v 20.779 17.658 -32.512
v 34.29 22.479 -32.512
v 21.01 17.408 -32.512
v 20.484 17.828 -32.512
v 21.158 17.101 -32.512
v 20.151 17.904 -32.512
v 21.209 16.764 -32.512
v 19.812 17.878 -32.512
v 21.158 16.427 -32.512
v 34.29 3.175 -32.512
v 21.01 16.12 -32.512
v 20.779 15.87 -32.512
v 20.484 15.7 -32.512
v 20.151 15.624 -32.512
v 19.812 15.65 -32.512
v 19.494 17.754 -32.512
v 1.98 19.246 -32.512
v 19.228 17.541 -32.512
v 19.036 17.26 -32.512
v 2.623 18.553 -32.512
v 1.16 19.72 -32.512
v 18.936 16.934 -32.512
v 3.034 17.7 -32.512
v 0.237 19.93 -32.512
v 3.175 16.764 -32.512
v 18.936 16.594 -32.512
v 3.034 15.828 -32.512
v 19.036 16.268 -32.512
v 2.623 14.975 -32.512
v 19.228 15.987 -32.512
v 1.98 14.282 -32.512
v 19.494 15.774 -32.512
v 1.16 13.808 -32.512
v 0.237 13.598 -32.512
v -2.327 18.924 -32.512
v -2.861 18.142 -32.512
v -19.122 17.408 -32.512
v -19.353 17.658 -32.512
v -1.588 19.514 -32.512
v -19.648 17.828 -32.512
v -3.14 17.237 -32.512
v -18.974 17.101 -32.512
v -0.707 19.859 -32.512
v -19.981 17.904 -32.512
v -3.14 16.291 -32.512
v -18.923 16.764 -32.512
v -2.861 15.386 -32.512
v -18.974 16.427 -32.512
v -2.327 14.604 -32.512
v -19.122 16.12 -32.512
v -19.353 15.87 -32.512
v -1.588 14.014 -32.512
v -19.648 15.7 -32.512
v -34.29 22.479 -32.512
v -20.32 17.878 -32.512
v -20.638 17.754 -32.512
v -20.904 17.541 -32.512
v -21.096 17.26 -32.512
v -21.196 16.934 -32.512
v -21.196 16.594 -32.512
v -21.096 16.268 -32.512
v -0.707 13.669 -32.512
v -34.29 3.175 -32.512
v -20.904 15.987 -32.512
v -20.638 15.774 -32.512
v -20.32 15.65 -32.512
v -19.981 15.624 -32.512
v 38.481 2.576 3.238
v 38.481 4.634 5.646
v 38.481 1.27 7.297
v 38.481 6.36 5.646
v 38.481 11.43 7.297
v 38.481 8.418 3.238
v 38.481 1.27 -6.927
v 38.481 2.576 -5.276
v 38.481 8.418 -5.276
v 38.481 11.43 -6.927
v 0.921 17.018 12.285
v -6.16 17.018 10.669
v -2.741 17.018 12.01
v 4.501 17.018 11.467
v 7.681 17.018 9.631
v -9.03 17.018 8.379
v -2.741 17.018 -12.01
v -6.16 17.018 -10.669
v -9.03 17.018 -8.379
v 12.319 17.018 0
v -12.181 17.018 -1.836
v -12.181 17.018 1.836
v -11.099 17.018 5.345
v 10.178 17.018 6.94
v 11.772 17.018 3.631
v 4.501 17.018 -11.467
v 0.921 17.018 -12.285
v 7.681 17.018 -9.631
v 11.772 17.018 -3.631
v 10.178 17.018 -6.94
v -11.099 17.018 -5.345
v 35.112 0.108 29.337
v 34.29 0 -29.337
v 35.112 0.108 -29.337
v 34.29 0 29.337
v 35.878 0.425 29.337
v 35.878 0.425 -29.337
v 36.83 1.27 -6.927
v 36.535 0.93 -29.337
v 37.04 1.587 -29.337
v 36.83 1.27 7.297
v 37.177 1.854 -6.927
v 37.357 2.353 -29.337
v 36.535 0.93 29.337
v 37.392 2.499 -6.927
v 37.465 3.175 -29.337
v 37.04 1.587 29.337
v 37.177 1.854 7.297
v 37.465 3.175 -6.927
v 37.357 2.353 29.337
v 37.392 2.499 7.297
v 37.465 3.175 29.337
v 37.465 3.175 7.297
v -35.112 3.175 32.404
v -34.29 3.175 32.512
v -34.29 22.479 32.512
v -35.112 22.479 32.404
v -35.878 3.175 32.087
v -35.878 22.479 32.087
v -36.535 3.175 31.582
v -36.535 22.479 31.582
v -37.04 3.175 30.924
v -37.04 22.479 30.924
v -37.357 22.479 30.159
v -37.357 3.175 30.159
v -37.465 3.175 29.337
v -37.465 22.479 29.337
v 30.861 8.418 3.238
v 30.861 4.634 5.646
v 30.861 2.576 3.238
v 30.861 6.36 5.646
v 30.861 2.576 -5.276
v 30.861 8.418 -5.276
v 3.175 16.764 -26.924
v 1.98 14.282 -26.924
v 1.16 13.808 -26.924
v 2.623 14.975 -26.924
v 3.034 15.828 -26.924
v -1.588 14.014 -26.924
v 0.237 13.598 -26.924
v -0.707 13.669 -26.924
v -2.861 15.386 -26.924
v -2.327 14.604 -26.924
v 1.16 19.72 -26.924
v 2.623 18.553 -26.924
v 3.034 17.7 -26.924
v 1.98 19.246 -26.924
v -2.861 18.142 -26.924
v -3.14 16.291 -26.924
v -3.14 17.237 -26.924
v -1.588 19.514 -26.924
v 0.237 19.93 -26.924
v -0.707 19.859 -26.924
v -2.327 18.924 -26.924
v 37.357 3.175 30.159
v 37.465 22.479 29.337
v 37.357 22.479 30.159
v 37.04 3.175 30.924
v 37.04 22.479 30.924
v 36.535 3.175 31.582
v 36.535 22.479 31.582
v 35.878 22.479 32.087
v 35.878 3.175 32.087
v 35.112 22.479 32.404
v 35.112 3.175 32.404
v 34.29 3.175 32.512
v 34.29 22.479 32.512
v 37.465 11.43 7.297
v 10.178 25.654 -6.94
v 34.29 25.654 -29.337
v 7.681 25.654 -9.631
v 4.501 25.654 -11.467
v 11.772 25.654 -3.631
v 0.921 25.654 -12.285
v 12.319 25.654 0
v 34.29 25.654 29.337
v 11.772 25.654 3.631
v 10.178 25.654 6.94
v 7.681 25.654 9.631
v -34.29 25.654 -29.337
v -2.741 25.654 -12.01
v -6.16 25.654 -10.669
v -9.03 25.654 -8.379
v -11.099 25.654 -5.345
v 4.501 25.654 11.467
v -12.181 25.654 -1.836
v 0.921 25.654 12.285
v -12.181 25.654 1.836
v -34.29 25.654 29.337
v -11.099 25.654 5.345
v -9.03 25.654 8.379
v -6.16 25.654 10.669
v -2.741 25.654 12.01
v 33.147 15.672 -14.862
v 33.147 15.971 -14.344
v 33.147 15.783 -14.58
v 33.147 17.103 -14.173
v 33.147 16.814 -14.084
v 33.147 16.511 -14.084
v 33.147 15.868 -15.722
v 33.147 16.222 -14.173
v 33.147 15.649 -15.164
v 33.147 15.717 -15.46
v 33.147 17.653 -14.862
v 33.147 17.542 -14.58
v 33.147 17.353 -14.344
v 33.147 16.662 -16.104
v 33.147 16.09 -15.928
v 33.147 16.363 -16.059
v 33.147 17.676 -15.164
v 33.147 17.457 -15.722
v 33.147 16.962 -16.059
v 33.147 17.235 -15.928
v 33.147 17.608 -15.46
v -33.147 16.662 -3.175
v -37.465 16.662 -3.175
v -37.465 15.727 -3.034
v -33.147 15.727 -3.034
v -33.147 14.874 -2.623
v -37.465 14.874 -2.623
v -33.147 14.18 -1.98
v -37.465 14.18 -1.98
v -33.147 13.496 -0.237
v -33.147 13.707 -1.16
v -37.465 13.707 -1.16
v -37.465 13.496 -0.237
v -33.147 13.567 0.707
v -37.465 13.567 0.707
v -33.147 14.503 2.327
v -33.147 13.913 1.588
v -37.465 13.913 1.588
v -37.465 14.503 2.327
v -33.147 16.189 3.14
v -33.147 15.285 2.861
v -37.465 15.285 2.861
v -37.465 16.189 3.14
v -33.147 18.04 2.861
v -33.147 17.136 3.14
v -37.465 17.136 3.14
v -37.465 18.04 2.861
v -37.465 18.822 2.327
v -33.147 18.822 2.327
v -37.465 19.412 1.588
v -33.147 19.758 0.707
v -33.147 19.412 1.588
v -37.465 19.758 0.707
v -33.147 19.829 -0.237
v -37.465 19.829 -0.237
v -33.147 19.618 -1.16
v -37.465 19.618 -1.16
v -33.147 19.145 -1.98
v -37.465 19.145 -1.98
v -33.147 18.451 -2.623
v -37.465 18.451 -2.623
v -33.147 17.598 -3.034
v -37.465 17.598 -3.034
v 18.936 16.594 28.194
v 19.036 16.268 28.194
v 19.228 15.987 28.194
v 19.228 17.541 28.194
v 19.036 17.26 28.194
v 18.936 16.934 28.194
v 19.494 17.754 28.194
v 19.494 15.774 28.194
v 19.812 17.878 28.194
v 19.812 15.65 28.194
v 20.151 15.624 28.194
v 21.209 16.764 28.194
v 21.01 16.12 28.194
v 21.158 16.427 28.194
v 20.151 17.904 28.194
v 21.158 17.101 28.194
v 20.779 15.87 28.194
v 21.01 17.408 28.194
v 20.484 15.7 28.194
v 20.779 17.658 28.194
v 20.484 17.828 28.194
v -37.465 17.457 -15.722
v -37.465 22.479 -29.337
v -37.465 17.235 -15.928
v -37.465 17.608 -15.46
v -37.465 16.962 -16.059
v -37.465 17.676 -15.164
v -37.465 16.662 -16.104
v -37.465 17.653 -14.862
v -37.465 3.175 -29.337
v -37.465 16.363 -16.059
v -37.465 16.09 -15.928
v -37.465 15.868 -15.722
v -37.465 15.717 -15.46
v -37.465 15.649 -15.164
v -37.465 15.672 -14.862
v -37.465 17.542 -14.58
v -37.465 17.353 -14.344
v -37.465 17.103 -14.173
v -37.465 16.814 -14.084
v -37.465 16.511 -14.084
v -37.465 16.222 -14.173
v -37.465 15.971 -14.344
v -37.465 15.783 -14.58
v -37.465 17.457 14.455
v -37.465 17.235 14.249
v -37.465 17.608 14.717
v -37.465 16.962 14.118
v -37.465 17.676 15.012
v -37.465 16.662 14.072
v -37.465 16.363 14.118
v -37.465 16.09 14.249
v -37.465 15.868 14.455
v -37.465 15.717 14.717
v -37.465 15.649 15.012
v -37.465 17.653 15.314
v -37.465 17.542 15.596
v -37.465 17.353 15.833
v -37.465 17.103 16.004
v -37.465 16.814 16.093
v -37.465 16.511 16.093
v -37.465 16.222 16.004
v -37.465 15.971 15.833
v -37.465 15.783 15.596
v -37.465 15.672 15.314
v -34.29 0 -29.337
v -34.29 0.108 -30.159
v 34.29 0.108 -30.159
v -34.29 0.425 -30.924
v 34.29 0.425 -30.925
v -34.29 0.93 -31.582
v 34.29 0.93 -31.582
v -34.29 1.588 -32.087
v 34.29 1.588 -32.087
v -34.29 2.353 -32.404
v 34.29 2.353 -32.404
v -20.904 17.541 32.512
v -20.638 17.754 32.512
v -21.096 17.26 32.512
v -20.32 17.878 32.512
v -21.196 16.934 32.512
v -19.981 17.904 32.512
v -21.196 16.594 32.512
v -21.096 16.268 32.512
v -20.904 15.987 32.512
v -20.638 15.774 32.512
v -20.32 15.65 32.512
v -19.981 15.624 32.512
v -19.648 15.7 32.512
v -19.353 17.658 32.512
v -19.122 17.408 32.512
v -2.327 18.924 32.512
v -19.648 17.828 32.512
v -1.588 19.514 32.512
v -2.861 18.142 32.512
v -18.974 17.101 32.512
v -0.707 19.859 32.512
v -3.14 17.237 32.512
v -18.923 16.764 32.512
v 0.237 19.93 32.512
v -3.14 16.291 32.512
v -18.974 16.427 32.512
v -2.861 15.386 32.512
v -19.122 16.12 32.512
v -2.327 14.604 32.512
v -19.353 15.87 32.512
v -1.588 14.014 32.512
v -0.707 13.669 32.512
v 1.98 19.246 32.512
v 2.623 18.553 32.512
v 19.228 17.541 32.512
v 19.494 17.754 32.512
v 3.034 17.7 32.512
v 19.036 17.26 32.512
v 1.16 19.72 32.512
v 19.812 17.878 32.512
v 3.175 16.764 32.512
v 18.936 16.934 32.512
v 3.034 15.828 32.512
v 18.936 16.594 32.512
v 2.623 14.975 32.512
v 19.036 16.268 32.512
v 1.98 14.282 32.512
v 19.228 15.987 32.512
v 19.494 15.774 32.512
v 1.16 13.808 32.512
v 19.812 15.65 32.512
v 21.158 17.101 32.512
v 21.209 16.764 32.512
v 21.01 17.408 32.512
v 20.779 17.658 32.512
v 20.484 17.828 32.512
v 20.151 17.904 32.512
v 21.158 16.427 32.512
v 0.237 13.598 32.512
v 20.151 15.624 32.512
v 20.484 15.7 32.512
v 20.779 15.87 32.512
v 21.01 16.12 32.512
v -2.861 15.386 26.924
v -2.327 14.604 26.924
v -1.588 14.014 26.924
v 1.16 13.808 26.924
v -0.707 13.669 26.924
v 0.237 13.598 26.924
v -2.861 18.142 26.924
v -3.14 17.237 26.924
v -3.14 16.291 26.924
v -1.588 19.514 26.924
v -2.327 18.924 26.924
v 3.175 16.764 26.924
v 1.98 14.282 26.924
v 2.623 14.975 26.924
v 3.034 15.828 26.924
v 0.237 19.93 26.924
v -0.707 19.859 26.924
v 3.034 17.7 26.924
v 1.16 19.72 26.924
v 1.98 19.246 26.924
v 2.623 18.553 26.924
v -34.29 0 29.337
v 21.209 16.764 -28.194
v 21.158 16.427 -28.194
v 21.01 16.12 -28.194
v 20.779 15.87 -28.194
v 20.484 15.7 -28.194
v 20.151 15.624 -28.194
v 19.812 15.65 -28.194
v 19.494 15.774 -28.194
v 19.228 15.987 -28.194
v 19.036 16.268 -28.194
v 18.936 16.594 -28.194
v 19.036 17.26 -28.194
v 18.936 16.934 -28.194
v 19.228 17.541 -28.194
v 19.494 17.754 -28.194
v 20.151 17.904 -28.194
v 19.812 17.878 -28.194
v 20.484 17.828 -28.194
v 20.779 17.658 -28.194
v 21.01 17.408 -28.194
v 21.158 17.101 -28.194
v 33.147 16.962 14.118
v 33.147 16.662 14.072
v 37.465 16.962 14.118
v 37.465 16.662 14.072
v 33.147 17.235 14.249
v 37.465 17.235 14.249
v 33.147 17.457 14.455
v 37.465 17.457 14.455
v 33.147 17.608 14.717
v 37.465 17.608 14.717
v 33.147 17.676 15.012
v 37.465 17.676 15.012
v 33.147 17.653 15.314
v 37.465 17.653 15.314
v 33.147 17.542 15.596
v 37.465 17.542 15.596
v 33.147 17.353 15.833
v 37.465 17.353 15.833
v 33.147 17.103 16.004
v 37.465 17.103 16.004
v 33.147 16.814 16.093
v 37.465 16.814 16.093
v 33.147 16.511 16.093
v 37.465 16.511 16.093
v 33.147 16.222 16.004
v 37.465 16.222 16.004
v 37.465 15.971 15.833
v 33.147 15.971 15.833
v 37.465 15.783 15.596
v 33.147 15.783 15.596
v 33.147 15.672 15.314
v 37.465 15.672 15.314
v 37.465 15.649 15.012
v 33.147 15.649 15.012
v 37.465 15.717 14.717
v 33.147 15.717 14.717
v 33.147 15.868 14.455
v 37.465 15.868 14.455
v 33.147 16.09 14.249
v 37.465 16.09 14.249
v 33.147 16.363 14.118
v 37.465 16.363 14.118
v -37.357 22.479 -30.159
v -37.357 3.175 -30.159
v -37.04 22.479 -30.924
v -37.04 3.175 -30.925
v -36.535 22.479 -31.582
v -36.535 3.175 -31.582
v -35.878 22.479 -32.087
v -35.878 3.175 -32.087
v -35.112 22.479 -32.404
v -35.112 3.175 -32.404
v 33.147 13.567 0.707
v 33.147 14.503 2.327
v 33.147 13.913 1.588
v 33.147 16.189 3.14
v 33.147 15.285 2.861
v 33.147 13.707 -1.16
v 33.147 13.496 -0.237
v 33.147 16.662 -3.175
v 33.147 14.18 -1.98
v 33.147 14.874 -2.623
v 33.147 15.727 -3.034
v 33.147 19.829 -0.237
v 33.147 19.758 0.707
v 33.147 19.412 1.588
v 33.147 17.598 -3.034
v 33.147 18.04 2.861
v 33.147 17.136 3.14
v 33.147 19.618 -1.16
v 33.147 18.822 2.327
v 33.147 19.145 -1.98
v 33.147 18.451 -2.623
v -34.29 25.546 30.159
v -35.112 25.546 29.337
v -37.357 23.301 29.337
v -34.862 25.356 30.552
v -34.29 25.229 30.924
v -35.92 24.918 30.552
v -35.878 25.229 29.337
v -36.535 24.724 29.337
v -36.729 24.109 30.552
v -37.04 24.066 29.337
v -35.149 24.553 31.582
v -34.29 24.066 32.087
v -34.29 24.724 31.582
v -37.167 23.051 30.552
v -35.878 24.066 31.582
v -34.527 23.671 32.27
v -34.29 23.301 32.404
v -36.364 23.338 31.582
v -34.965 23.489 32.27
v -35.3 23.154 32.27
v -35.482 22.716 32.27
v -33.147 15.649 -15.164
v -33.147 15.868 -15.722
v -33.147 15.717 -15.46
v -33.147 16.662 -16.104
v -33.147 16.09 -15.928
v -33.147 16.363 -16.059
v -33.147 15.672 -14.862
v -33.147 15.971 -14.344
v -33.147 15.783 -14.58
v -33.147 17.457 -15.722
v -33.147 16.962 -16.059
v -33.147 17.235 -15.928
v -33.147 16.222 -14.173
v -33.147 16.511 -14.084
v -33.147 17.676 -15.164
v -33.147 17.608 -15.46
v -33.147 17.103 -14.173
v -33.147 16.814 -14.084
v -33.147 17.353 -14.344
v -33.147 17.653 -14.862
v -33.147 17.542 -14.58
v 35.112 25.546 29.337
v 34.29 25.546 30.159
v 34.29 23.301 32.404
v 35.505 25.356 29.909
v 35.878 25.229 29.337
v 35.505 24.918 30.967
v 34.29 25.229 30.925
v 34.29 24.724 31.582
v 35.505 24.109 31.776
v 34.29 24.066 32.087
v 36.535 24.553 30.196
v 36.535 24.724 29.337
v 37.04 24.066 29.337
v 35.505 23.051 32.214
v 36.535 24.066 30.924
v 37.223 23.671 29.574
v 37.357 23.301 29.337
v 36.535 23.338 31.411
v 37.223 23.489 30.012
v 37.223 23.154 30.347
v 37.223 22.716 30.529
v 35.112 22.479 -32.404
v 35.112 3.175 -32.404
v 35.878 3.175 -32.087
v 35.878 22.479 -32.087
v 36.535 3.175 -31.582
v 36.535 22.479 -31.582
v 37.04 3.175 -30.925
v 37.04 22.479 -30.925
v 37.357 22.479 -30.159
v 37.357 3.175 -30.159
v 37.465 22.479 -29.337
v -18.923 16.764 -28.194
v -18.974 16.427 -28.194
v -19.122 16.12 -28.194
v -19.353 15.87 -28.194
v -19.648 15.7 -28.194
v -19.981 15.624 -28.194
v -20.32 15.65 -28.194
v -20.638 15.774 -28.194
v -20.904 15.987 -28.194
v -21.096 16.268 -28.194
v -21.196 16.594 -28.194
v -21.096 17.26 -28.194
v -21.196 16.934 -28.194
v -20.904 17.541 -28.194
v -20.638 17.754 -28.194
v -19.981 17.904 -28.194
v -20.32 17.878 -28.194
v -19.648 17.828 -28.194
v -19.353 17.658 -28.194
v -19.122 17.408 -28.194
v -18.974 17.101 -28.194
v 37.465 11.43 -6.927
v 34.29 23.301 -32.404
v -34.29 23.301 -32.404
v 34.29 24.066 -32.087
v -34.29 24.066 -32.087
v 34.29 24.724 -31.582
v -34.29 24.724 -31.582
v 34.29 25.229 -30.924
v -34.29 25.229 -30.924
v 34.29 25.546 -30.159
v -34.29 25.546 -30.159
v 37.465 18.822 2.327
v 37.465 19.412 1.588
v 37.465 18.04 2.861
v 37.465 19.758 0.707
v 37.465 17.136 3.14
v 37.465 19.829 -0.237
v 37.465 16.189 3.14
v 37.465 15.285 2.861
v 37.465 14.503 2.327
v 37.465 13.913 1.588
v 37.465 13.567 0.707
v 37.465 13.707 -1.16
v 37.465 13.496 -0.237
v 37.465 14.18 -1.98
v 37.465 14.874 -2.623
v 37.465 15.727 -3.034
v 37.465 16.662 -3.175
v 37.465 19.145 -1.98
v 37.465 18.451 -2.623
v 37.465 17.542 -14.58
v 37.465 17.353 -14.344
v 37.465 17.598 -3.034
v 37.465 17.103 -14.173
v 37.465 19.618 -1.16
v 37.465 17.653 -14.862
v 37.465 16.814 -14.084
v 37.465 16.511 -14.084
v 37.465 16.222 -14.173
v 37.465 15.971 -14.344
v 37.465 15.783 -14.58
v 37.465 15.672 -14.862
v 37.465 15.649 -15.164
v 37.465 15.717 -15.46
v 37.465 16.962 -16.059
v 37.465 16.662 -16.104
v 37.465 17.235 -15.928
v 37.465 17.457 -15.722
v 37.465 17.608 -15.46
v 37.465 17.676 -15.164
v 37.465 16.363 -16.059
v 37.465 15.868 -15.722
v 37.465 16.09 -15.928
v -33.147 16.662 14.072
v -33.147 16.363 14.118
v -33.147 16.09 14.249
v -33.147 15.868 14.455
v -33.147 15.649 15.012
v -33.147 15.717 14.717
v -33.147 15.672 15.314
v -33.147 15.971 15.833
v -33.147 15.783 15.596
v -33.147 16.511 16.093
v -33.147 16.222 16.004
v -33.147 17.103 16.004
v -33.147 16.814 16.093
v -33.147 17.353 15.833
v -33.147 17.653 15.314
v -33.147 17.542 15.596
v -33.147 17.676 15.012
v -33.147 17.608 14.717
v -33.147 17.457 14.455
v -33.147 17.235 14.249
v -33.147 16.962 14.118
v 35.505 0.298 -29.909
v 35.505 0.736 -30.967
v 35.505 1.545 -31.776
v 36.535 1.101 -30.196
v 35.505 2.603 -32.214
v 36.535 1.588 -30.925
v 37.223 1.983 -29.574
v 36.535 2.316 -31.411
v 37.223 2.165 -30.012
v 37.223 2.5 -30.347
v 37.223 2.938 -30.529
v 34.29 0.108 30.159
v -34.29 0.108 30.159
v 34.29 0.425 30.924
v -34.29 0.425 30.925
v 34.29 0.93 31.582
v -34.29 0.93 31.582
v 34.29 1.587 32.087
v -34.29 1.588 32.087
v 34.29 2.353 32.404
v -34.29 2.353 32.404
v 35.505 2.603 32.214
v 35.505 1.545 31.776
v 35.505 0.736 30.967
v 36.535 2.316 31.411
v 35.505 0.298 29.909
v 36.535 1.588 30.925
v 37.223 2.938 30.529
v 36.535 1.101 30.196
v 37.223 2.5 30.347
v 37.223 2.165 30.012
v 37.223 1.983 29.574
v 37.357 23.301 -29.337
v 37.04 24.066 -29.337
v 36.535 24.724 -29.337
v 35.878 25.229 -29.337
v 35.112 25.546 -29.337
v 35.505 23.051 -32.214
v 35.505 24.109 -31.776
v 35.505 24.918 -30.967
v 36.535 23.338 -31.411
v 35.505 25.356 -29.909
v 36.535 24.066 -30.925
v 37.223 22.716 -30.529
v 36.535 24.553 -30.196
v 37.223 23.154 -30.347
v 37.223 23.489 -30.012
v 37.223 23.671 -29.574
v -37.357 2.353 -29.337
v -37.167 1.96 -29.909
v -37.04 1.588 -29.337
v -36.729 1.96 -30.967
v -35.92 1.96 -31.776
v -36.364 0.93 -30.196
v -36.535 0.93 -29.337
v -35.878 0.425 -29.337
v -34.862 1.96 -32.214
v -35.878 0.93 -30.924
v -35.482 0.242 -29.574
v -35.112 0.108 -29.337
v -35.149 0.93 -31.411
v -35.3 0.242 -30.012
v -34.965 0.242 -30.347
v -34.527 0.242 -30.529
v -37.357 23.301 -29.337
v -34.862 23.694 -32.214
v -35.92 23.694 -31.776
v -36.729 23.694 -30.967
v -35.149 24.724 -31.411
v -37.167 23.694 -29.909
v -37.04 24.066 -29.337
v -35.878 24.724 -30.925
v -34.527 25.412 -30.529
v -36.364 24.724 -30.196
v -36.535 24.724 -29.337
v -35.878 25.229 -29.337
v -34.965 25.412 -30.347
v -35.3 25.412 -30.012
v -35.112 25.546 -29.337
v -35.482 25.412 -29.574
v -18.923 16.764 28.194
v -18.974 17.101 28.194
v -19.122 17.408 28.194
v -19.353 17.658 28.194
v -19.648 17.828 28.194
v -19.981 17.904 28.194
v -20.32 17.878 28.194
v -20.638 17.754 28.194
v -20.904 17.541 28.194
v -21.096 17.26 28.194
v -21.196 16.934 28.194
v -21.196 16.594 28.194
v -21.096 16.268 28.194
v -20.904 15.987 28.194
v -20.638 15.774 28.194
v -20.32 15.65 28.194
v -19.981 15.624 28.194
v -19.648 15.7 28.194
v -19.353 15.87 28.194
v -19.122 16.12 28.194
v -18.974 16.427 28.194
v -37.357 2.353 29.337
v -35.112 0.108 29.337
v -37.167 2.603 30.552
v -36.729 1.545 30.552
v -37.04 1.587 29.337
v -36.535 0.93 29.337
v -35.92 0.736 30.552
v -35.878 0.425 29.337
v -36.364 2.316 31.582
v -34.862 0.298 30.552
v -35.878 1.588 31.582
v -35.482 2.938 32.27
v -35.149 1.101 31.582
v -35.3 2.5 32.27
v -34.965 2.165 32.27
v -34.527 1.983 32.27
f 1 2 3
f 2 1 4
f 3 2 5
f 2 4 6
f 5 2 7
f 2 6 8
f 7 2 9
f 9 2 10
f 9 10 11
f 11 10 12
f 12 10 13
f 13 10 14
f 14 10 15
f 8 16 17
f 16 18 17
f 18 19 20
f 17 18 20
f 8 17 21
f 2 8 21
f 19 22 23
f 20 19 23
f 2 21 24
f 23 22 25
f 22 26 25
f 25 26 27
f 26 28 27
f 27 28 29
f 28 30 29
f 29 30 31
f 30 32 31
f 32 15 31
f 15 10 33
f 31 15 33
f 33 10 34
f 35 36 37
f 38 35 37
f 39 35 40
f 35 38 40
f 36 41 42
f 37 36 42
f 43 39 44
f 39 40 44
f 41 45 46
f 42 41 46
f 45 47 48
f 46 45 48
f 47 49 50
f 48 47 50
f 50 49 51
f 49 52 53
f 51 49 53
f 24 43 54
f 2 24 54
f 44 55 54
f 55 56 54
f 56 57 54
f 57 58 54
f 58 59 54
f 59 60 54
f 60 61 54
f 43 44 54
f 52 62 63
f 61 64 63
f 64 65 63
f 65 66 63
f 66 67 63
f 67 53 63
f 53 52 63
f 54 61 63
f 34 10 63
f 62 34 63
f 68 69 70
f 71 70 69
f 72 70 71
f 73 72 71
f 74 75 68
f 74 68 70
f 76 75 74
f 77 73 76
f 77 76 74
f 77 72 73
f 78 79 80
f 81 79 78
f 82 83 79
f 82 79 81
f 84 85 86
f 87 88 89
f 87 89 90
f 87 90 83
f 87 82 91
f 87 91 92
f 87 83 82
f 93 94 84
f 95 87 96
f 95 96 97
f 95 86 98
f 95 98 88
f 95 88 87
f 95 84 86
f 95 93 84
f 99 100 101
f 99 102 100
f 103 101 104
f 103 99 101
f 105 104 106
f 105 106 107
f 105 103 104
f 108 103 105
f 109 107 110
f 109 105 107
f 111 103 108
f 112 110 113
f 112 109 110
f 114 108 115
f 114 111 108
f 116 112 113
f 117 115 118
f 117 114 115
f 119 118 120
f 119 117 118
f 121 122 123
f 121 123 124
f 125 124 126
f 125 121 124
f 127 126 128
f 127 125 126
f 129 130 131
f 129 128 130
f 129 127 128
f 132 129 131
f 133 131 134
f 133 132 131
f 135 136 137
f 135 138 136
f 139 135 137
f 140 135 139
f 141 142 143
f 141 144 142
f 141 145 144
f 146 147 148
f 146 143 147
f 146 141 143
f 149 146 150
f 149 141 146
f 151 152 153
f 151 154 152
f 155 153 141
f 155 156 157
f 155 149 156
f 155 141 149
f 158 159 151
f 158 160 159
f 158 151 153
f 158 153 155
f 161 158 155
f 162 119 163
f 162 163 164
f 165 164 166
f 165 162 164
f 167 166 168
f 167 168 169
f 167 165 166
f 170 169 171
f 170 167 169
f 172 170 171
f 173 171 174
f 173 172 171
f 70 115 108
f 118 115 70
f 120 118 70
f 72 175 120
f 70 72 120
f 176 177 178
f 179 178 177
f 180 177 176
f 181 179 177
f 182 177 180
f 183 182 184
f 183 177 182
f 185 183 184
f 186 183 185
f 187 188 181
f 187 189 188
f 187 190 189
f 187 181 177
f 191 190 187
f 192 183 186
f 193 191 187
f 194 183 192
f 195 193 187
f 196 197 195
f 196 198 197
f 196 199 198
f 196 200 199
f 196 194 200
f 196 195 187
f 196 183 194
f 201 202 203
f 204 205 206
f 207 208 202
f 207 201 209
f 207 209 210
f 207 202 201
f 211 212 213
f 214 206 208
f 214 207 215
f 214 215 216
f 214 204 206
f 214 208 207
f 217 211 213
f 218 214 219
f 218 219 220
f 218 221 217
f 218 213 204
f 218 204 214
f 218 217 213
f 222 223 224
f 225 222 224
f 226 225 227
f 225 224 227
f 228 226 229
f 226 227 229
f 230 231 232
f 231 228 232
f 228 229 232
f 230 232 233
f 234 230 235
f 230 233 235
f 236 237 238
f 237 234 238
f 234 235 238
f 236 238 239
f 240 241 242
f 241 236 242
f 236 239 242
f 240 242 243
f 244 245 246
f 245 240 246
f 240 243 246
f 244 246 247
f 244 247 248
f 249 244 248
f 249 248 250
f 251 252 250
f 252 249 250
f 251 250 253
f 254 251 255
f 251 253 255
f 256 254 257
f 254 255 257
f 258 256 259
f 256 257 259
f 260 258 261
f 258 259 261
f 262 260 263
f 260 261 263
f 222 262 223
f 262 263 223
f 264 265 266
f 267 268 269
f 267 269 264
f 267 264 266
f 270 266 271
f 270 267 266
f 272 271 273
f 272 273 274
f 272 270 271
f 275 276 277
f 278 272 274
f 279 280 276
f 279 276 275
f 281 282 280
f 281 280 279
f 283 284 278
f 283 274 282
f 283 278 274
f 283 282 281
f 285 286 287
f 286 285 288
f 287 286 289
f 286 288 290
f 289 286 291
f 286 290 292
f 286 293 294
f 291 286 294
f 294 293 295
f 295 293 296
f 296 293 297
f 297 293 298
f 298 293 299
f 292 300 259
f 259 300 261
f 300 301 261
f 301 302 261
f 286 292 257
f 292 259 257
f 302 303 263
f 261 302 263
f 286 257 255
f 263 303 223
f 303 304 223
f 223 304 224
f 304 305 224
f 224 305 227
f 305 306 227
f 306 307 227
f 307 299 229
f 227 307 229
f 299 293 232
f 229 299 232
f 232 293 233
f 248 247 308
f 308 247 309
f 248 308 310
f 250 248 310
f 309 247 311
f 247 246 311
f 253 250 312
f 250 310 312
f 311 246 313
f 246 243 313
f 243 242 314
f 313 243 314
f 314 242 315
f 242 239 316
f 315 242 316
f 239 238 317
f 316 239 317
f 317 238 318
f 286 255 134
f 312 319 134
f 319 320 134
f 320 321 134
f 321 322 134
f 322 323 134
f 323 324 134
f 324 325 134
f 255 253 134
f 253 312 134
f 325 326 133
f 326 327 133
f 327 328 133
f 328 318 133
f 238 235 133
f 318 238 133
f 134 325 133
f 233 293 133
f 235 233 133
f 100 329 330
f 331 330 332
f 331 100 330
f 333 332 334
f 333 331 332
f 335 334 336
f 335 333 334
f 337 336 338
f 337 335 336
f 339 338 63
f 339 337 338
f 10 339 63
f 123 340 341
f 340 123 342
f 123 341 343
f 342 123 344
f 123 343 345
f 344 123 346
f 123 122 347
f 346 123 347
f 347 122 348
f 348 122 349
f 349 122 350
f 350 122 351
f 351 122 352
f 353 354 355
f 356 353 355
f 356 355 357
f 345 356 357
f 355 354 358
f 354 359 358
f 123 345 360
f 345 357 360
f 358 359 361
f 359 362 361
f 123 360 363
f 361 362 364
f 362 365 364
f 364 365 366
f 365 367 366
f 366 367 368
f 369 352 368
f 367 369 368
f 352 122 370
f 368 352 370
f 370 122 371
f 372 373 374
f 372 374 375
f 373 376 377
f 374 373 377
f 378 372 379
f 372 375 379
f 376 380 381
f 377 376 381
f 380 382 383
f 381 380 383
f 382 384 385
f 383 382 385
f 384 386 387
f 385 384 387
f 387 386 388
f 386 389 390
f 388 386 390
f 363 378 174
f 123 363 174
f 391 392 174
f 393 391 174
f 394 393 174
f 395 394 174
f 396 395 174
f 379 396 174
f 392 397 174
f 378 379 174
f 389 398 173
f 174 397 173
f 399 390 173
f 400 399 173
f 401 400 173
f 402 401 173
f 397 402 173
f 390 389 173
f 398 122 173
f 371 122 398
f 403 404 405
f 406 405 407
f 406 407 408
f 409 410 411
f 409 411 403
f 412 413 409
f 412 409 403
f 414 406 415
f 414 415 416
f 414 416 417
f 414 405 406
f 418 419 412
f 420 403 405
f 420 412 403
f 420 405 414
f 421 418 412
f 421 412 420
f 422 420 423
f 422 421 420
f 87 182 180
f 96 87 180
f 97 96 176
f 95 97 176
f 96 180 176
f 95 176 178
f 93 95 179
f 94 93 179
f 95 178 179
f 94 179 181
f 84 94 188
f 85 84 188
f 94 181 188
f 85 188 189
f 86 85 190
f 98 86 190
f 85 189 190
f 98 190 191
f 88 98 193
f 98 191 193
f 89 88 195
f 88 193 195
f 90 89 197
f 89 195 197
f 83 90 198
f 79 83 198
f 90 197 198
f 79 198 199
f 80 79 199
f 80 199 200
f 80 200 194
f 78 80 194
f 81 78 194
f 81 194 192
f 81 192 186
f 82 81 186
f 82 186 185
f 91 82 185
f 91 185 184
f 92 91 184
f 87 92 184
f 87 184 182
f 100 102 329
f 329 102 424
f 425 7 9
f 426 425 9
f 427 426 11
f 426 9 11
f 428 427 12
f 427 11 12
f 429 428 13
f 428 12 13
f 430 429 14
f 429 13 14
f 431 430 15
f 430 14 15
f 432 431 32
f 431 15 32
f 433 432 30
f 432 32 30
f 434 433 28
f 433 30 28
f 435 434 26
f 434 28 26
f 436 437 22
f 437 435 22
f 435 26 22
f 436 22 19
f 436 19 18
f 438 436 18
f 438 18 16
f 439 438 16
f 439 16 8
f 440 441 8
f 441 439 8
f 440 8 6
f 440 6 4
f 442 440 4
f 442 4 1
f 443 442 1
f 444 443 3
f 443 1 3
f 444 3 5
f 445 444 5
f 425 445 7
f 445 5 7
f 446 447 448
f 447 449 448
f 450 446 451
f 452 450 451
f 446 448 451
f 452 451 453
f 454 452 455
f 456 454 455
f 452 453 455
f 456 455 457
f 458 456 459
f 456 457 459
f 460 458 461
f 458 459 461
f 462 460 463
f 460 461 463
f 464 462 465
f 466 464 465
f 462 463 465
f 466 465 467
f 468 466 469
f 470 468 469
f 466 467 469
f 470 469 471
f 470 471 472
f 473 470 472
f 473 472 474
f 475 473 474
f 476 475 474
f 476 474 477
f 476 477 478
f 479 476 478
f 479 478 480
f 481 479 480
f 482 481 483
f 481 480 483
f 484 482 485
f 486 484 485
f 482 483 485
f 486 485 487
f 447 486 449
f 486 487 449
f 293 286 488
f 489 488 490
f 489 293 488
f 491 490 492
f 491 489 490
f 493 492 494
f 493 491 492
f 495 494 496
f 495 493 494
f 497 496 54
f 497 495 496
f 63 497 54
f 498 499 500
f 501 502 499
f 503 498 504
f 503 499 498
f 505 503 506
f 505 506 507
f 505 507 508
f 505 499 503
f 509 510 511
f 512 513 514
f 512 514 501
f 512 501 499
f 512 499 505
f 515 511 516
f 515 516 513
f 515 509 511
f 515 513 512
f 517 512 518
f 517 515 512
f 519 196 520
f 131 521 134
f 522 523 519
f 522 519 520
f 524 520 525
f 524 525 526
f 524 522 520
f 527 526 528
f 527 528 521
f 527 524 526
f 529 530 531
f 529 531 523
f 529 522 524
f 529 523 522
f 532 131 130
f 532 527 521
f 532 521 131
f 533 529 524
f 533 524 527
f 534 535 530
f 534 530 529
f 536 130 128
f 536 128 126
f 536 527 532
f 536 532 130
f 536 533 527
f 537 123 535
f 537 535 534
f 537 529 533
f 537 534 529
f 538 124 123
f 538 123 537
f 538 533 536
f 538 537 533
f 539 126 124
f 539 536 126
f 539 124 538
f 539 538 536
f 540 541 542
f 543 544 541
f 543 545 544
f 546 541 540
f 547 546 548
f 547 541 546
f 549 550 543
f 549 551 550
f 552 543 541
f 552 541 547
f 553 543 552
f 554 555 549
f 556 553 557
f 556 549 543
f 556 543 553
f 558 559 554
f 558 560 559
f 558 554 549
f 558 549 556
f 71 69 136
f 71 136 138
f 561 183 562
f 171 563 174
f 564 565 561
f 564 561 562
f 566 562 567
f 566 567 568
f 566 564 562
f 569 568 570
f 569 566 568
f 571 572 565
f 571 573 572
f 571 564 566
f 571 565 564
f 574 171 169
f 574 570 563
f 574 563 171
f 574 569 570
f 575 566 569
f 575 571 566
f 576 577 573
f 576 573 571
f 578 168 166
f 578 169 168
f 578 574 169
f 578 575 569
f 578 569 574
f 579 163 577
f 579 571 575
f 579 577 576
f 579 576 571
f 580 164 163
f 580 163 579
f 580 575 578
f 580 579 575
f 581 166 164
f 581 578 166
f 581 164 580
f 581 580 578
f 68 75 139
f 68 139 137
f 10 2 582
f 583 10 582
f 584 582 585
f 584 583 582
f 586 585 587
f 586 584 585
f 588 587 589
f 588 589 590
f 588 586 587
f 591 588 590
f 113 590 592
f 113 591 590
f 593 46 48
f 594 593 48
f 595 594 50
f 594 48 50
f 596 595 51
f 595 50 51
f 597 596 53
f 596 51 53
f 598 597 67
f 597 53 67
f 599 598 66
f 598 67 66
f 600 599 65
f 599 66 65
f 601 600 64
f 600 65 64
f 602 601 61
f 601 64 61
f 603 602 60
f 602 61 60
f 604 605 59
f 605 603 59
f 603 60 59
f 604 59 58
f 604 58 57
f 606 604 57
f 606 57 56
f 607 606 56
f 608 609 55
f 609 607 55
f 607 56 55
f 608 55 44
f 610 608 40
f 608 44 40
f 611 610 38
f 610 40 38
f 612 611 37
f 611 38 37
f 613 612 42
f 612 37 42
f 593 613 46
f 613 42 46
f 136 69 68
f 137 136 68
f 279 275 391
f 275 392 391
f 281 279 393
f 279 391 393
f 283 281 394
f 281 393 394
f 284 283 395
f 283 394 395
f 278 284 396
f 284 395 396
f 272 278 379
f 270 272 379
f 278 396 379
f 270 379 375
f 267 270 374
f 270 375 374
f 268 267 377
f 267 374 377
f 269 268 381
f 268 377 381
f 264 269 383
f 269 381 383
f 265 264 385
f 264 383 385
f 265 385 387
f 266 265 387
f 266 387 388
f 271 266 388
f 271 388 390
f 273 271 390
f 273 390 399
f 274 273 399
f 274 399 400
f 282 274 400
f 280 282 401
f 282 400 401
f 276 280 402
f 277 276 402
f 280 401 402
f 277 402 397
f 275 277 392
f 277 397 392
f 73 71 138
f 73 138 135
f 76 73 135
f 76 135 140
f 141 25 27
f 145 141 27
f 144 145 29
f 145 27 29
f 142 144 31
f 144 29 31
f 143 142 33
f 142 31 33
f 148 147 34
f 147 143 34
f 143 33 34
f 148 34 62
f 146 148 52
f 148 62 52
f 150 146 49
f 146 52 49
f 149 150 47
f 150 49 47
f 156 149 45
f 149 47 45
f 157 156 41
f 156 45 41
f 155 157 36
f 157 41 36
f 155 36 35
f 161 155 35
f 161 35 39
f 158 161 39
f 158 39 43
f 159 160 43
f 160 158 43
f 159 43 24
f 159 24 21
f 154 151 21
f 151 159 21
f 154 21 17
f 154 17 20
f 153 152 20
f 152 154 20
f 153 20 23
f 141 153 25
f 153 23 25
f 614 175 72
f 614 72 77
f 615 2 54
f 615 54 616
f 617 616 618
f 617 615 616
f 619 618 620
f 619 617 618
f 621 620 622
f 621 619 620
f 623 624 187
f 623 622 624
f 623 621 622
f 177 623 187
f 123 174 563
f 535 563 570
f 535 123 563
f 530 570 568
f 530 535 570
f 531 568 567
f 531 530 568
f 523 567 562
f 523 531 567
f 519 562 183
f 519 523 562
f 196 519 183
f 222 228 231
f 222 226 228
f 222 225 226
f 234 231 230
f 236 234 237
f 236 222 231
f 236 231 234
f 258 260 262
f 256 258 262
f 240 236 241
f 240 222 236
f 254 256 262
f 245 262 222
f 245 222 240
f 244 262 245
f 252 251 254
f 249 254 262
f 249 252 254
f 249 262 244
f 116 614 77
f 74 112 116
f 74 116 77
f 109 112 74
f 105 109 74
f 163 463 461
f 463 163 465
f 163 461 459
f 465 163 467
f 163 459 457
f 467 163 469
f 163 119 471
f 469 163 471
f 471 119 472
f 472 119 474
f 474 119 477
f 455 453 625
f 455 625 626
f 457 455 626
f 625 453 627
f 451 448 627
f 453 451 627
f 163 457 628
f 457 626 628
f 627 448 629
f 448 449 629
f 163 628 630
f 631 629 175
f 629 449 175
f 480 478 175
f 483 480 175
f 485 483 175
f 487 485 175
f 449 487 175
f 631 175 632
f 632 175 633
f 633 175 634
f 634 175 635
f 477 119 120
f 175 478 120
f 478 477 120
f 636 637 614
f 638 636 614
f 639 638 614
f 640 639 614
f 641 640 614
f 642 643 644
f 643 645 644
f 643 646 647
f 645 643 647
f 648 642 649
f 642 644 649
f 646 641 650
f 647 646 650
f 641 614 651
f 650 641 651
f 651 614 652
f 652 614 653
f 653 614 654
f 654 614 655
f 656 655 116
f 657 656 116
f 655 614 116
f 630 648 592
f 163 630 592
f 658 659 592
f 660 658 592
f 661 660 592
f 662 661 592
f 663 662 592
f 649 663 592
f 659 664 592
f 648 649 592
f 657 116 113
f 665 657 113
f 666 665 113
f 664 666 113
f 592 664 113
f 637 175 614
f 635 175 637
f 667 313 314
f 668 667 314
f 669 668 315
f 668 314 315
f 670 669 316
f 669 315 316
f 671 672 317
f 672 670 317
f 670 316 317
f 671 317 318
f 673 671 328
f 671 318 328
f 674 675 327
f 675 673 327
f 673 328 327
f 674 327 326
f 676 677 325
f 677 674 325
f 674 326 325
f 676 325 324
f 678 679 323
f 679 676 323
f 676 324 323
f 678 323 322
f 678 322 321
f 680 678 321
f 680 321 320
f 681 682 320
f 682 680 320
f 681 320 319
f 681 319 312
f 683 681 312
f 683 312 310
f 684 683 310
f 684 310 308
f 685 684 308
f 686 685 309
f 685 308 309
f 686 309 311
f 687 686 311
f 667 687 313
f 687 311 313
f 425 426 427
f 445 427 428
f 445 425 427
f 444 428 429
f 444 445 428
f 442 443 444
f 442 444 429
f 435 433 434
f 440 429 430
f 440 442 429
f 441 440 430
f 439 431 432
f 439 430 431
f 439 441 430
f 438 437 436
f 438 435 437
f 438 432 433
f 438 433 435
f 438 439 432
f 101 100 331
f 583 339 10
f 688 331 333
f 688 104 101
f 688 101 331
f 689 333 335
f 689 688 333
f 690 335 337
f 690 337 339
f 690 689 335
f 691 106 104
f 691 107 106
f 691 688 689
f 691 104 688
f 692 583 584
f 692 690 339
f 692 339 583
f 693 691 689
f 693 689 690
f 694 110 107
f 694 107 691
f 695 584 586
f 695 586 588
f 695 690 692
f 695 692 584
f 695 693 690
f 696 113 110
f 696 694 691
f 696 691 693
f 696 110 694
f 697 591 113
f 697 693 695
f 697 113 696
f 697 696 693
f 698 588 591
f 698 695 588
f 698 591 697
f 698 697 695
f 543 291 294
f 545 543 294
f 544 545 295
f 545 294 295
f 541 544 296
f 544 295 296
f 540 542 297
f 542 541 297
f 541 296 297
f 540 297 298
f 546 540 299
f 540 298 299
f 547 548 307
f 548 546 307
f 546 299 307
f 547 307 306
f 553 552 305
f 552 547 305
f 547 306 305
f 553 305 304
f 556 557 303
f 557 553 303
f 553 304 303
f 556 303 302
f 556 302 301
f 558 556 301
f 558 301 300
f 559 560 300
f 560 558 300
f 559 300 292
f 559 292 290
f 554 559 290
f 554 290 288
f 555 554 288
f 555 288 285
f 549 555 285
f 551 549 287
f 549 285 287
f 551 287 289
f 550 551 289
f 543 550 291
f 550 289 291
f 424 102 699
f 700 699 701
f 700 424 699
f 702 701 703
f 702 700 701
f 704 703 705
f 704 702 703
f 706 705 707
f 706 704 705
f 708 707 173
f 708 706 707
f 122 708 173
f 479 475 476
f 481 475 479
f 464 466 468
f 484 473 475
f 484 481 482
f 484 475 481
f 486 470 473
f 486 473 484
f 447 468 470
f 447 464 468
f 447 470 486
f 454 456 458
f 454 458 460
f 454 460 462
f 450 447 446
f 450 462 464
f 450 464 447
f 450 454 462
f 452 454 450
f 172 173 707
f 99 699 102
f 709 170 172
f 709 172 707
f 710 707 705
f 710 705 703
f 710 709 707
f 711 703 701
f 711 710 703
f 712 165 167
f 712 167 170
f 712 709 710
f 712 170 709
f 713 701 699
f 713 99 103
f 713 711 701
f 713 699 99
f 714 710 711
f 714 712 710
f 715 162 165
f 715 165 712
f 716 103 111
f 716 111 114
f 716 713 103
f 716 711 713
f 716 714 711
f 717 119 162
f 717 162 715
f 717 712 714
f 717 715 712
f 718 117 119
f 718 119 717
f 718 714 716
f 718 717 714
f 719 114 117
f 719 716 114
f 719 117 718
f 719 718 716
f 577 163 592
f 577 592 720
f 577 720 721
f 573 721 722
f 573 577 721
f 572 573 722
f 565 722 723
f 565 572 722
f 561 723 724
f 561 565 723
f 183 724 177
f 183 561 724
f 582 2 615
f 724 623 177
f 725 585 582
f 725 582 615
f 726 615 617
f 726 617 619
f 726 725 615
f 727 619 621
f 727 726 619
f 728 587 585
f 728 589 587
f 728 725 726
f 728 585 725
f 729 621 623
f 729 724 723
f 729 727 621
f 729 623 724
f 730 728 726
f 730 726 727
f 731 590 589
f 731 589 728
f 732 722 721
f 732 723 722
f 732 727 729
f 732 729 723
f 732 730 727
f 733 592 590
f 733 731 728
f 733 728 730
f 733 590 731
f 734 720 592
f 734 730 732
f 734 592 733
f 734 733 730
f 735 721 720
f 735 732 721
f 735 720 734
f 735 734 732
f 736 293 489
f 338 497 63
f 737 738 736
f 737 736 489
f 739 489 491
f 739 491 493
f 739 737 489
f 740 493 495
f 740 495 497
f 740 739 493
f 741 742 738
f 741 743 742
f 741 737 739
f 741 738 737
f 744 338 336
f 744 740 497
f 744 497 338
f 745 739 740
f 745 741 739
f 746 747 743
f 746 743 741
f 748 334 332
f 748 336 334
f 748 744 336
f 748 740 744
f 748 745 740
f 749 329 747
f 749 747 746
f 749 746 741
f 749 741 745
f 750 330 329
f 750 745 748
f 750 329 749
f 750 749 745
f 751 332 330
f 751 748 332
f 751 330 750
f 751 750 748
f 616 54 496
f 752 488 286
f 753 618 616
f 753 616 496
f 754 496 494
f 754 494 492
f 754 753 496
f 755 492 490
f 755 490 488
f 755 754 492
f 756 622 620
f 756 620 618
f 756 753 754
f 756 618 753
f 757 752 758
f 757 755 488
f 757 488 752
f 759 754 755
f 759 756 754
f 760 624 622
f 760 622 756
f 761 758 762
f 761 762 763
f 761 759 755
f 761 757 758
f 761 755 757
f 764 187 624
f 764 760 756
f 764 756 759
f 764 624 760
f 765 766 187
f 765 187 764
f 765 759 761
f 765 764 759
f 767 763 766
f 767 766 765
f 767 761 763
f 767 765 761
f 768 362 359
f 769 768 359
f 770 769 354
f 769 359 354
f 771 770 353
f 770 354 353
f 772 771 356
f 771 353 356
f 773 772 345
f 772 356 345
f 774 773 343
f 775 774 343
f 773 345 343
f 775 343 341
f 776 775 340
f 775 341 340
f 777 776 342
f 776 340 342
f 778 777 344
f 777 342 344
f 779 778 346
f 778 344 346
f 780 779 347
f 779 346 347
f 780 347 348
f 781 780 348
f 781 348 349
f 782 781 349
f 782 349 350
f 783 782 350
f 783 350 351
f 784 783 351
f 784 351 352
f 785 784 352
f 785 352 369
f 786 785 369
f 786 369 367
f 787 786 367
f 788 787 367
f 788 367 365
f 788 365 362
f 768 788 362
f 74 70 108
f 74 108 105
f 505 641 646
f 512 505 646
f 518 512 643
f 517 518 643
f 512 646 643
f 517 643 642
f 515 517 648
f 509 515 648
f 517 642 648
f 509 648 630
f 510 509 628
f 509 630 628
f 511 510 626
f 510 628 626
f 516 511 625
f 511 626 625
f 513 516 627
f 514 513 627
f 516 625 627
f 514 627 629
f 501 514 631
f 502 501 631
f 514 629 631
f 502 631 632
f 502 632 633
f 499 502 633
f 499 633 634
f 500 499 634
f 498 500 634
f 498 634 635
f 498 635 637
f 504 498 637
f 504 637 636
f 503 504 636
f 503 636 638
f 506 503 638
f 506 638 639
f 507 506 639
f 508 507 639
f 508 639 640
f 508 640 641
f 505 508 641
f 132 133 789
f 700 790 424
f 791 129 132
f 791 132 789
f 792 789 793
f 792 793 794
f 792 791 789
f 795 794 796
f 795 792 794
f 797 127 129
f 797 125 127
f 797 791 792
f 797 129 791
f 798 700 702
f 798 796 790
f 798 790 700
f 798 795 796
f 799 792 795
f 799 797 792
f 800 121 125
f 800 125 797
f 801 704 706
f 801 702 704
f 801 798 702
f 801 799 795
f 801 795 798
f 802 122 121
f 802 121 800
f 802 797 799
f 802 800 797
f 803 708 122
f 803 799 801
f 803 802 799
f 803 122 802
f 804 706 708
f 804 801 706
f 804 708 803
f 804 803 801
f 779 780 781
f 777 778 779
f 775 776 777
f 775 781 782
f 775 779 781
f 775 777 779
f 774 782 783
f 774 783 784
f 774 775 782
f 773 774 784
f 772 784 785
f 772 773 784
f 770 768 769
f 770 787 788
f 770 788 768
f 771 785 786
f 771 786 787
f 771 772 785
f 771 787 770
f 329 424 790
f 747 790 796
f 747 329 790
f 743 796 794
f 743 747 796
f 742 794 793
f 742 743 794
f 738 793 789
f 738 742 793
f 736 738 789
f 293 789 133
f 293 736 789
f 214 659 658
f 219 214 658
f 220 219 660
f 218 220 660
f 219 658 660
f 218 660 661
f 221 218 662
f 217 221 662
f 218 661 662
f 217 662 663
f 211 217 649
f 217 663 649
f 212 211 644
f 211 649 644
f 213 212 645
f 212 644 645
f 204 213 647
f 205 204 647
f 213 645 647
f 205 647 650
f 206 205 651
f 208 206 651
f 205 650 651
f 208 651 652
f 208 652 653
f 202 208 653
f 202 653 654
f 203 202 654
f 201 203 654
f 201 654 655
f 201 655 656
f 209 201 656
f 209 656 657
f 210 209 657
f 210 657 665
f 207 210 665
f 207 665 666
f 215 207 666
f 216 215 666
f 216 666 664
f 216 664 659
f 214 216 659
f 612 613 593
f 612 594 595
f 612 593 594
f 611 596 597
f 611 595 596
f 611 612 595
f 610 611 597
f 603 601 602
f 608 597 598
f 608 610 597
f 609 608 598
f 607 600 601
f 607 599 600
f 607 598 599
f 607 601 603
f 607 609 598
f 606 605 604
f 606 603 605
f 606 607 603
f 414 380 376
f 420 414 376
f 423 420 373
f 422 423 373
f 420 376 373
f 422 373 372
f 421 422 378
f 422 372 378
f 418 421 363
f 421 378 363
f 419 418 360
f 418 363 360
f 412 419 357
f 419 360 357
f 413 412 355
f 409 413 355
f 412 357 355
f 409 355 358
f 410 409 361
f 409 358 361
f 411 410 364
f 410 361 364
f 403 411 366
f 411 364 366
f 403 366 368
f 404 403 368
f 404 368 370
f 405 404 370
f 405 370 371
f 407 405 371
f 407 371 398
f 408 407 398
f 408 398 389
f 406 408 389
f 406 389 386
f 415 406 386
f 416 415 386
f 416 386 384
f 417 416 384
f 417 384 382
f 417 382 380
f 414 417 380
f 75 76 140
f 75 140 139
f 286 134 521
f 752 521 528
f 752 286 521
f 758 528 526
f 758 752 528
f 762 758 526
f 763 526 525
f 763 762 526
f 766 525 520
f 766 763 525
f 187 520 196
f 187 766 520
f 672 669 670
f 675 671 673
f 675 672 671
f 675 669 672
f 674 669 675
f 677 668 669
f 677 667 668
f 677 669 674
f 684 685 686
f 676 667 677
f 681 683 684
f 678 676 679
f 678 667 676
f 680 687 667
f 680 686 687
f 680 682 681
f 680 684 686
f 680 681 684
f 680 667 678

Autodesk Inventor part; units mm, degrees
ref_plane "YZ Plane" through (0, 0, 0) normal (1, 0, 0) x (0, 1, 0)
ref_plane "XZ Plane" through (0, 0, 0) normal (0, 1, 0) x (-1, 0, 0)
ref_plane "XY Plane" through (0, 0, 0) normal (0, 0, 1) x (1, 0, 0)
sketch "Sketch1" plane through (0, 0, 0) normal (0, 1, 0) x (-1, 0, 0)
  line L0 (-37.465, -32.512) -> (37.465, -32.512)
  line L1 (37.465, -32.512) -> (37.465, 32.512)
  line L2 (37.465, 32.512) -> (-37.465, 32.512)
  line L3 (-37.465, 32.512) -> (-37.465, -32.512)
  line L4 (-37.465, -32.512) -> (37.465, 32.512) construction
  line L5 (37.465, -32.512) -> (-37.465, 32.512) construction
  point P0 (0, 0)
  point P1 (0, 0)
  dimension "d0" = 74.93
  dimension "d1" = 65.024
extrude "Extrusion1" add sketch "Sketch1" along normal blind 25.654
sketch "Sketch2" plane through (-37.465, 0, 32.512) normal (0, 0, 1) x (1, 0, 0)
  line L0 (74.93, 0) -> (74.93, 25.654) projected
  line L1 (0, 25.654) -> (74.93, 25.654) projected
  line L2 (0, 0) -> (0, 25.654) projected
  circle A0 centre (37.465, 16.764) radius 3.175
  point P0 (37.465, 0)
  dimension "d4" = 6.35
  dimension "d5" = 37.465
  dimension "d6" = 37.465
  dimension "d7" = 8.89
extrude "Extrusion2" cut sketch "Sketch2" against normal blind 5.588
sketch "Sketch3" plane through (-37.465, 0, 32.512) normal (0, 0, 1) x (1, 0, 0)
  circle A0 centre (37.465, 16.764) radius 3.175 projected
  line L0 (74.93, 0) -> (74.93, 25.654) projected
  line L1 (0, 0) -> (0, 25.654) projected
  circle A1 centre (57.531, 16.764) radius 1.143
  line L2 (37.465, 25.654) -> (37.465, 0) construction
  circle A2 centre (17.399, 16.764) radius 1.143
  dimension "d10" = 2.286
  dimension "d11" = 20.066
  dimension "d12" = 20.066
  dimension "d13" = 37.465
  dimension "d14" = 37.465
extrude "Extrusion3" cut sketch "Sketch3" against normal blind 4.318 contours A1 | A2
ref_plane "Work Plane1" through (-37.465, 0, 0) normal (0, 0, 1) x (1, 0, 0)
mirror "Mirror1" about plane through (-37.465, 0, 0) normal (0, 0, 1) of "Extrusion2", "Extrusion3"
ref_plane "Work Plane2" through (0, 0, 32.512) normal (1, 0, 0) x (0, 0, -1)
sketch "Sketch4" plane through (37.465, 0, 32.512) normal (1, 0, 0) x (0, 0, -1)
  line L0 (0, 25.654) -> (65.024, 25.654) projected
  circle A0 centre (32.512, 16.6624) radius 3.175
  circle A1 centre (47.6004, 16.6624) radius 1.016
  line L1 (32.512, 25.654) -> (32.512, 0) construction
  circle A2 centre (17.4236, 16.6624) radius 1.016
  dimension "d19" = 6.35
  dimension "d20" = 8.9916
  dimension "d21" = 2.032
extrude "Extrusion4" cut sketch "Sketch4" against normal blind 4.318
mirror "Mirror2" about plane through (0, 0, 32.512) normal (1, 0, 0) of "Extrusion4"
sketch "Sketch5" plane through (0, 25.654, 0) normal (0, 1, 0) x (1, 0, 0)
  circle A0 centre (0, 0) radius 12.319
  dimension "d24" = 24.638
extrude "Extrusion5" cut sketch "Sketch5" against normal blind 8.636
sketch "Sketch6" plane through (37.465, 0, 32.512) normal (1, 0, 0) x (0, 0, -1)
  line L0 (0, 25.654) -> (65.024, 25.654) projected
  line L1 (25.2146, 11.43) -> (39.4386, 11.43)
  line L2 (39.4386, 11.43) -> (39.4386, 1.27)
  line L3 (39.4386, 1.27) -> (25.2146, 1.27)
  line L4 (25.2146, 1.27) -> (25.2146, 11.43)
  point P0 (32.512, 0)
  dimension "d27" = 14.224
  dimension "d28" = 10.16
  dimension "d29" = 14.224
extrude "Extrusion6" add sketch "Sketch6" along normal blind 1.016
sketch "Sketch7" plane through (38.481, 0, 32.512) normal (1, 0, 0) x (0, 0, -1)
  line L0 (25.2146, 11.43) -> (25.2146, 1.27) projected
  line L1 (39.4386, 1.27) -> (39.4386, 11.43) projected
  line L2 (26.8656, 8.4177) -> (37.7876, 8.4177)
  line L3 (37.7876, 8.4177) -> (37.7876, 2.5757)
  line L4 (37.7876, 2.5757) -> (26.8656, 2.5757)
  line L5 (26.8656, 4.6339) -> (26.8656, 6.3596)
  line L6 (26.8656, 4.6339) -> (29.2737, 2.5757)
  line L7 (26.8656, 5.4967) -> (37.7876, 5.4967) construction
  line L8 (26.8656, 6.3596) -> (29.2737, 8.4177)
  point P0 (32.512, 0)
  dimension "d32" = 5.842
  dimension "d34" = 10.922
  dimension "d35" = 1.651
  dimension "d36" = 1.651
extrude "Extrusion7" cut sketch "Sketch7" against normal blind 7.62
fillet "Fillet1" radius 3.175 12 edges at (0, 25.654, -32.512) (37.465, 12.827, -32.512) (37.465, 25.654, 0) (-37.465, 25.654, 0) (-37.465, 12.827, -32.512) (0, 0, -32.512) (37.465, 0, 0) (-37.465, 0, 0) (0, 0, 32.512) (37.465, 12.827, 32.512) (0, 25.654, 32.512) (-37.465, 12.827, 32.512)
equation "\"d5\" = d6"
equation "\"d12\" = d11"
equation "\"d13\" = d14"
equation "\"d35\" = d36"
properties part number "dragonfly2Camera" material "Aluminum 6061"
